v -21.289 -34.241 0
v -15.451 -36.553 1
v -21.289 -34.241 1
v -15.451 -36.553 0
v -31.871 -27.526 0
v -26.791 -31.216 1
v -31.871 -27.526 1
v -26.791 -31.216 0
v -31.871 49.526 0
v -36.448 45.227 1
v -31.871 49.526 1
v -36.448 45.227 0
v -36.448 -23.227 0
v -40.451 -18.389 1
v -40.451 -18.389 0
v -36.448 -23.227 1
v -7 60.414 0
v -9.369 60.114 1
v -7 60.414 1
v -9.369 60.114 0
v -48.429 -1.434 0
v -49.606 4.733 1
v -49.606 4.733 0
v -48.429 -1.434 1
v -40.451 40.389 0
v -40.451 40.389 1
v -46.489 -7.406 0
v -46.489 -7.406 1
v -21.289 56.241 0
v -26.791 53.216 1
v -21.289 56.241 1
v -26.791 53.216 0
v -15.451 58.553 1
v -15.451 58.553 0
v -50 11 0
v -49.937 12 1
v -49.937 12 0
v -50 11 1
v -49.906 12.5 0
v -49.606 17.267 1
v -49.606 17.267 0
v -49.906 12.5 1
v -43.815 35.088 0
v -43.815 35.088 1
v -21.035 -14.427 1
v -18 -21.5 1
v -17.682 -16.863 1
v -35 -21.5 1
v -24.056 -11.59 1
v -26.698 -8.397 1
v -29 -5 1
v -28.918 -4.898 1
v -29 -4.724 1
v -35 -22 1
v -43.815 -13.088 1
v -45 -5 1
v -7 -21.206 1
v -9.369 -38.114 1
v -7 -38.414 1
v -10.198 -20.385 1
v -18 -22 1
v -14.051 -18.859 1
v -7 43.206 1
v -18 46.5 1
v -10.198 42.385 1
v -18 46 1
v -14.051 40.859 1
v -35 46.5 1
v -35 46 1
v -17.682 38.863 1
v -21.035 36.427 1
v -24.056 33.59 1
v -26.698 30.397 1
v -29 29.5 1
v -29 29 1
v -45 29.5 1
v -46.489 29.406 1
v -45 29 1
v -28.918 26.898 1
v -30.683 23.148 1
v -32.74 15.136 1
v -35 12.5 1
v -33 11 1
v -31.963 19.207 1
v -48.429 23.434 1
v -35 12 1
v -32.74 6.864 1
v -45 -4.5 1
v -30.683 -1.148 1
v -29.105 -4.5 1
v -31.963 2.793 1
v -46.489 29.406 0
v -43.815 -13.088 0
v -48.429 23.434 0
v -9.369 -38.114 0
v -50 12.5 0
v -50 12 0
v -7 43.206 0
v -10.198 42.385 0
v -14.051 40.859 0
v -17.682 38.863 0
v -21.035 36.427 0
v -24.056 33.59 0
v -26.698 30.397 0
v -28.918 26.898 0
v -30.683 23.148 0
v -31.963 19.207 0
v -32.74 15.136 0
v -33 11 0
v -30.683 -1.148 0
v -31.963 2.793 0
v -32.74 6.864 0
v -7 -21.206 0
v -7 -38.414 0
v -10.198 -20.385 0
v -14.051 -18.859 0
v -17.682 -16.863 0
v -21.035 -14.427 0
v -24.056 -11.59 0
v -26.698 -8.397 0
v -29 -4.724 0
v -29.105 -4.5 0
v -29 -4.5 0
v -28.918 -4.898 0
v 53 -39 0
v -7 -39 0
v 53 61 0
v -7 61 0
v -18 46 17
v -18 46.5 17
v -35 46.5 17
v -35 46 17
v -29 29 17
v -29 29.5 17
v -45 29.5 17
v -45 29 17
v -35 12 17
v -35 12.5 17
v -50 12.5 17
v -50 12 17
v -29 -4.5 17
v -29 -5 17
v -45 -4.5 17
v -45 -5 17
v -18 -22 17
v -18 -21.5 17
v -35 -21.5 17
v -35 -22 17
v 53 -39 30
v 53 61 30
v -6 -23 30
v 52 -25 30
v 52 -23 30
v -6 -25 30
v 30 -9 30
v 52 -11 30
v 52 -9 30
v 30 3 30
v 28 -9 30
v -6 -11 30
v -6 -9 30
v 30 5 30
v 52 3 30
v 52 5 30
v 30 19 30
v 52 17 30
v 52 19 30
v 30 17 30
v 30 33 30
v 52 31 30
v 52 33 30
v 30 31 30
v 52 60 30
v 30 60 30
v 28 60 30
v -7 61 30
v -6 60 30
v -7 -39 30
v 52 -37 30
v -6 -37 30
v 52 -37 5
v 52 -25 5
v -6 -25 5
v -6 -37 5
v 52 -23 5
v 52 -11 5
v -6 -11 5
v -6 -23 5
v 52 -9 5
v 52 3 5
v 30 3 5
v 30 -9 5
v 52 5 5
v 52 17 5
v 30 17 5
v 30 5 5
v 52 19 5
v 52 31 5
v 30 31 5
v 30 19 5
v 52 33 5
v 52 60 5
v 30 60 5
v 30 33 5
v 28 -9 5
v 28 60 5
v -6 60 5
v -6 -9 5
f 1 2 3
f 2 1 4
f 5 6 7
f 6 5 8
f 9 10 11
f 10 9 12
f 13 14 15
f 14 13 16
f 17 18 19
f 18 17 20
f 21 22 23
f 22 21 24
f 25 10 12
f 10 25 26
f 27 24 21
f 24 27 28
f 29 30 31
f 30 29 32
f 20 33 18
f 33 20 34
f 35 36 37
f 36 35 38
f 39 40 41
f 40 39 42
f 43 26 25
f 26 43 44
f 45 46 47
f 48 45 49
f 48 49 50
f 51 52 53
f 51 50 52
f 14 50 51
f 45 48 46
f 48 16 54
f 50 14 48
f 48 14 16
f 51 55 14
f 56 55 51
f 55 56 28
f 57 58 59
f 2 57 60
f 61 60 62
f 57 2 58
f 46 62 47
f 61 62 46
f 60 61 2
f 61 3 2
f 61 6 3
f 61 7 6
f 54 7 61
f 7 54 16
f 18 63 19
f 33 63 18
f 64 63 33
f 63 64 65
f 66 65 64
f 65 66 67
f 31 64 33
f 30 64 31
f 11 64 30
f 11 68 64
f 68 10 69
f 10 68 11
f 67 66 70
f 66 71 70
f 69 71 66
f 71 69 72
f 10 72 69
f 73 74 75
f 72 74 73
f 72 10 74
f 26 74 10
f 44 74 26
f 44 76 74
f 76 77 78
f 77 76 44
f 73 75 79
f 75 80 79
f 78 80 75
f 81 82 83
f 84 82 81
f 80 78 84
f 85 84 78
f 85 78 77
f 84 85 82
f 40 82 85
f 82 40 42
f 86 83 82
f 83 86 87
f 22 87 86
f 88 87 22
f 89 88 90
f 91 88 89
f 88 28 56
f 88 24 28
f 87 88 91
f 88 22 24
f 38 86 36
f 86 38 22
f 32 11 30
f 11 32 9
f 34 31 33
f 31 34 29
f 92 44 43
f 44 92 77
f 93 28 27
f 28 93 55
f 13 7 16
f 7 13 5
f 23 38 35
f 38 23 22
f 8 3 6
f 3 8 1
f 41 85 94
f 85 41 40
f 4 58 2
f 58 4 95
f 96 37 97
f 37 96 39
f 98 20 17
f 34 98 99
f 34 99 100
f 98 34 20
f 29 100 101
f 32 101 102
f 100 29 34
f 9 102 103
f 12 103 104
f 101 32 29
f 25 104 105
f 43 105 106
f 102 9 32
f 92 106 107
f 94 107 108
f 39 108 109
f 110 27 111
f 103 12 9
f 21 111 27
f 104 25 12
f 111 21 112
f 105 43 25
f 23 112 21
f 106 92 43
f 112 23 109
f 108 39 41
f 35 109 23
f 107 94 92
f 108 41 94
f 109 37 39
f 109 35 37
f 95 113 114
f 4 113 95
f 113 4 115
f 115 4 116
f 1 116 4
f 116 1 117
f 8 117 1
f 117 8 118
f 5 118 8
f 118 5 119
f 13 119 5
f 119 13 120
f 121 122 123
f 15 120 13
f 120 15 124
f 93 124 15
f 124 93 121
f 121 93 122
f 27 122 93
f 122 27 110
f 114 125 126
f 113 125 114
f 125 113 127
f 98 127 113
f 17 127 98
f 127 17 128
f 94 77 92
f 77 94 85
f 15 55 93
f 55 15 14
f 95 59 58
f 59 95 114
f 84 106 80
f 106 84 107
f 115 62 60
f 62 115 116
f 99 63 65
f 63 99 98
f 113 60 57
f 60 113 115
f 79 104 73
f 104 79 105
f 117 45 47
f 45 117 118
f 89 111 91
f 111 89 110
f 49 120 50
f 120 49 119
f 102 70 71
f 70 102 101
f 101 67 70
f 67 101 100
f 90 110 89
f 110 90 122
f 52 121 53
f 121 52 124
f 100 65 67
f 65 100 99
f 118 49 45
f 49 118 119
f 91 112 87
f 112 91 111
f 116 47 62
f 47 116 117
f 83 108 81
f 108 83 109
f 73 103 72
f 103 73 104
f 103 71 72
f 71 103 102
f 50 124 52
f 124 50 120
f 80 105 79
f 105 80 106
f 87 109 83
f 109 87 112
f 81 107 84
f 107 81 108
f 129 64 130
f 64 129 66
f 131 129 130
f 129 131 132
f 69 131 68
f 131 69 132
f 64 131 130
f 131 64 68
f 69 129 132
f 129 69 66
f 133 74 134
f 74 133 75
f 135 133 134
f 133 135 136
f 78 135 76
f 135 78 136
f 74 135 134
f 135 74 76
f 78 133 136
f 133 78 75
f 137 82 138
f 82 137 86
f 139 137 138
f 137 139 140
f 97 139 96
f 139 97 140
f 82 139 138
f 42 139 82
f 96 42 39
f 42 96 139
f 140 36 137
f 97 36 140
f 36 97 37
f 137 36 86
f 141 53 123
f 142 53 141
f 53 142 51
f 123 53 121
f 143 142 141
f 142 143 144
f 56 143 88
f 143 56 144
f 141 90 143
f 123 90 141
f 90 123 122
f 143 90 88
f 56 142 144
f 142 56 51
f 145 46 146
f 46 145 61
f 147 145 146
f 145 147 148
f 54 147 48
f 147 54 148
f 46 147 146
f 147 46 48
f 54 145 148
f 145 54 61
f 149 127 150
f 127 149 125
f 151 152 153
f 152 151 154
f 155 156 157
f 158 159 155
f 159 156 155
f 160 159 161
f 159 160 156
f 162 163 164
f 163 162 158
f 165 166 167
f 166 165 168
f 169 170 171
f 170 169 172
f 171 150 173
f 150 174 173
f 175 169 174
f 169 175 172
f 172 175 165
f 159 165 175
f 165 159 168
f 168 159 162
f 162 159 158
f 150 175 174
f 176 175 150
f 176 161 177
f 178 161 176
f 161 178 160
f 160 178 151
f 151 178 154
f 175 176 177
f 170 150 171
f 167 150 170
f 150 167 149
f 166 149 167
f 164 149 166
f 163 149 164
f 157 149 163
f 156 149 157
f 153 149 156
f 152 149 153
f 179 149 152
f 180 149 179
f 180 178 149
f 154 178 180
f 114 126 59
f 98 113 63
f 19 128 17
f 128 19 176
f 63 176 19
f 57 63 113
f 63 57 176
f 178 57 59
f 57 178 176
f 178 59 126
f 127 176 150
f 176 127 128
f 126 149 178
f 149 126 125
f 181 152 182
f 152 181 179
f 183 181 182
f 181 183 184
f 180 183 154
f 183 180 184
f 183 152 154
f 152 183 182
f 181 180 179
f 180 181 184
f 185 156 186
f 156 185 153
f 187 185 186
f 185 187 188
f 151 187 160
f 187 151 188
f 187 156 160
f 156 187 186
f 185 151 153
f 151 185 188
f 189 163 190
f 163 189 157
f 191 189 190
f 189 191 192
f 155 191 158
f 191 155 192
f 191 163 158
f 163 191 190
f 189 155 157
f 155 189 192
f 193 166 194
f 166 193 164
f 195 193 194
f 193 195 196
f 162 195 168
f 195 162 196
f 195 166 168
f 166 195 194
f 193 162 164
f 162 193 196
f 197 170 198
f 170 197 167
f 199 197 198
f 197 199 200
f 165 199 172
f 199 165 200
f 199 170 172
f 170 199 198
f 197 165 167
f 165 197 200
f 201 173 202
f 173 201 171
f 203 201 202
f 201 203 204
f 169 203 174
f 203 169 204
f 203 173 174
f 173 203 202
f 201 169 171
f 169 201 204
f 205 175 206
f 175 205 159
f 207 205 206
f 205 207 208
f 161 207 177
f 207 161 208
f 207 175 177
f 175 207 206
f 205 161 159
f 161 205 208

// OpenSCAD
//import("/Users/cnandi/research/reincarnate/src/ocaml/phase2/infer/benchmarks/finalbenches/wardrobe/stunning_kieran-amberis.stl");

union() {

difference() {
    translate([0, 11, 0]) {
    scale([50, 50, 1])
    cylinder($fn = 50);
    }

    translate([0, 11, 0]) {
    scale([33, 33, 1])
    cylinder($fn = 50);
    }
}

union () {
    translate([-35, 46, 0]) {
    scale([17, 0.5, 17])
    cube();
    }

    translate([-45, 29, 0]) {
    scale([16, 0.5, 17])
    cube();
    }
    
    translate([-50, 12, 0]) {
    scale([15, 0.5, 17])
    cube();
    }
    
    translate([-45, -5, 0]) {
    scale([16, 0.5, 17])
    cube();
    }
    
    translate([-35, -22, 0]) {
    scale([17, 0.5, 17])
    cube();
    }   
}



difference() {

    translate([-7, -39, 0]) {
    scale([60, 100, 30])
    cube();
    }
   
    translate([-6, -37, 5]) {
    scale([58, 12, 30])
    cube();
    }
    
    translate([-6, -23, 5]) {
    scale([58, 12, 30])
    cube();
    }
    
    translate([30, -9, 5]) {
    scale([22, 12, 30])
    cube();
    }
    
    translate([30, 5, 5]) {
    scale([22, 12, 30])
    cube();
    }

    translate([30, 19, 5]) {
    scale([22, 12, 30])
    cube();
    }

    translate([30, 33, 5]) {
    scale([22, 27, 30])
    cube();
    }
 
    translate([-6, -9, 5]) {
    scale([34, 69, 50])
    cube();
    }  
}

}
